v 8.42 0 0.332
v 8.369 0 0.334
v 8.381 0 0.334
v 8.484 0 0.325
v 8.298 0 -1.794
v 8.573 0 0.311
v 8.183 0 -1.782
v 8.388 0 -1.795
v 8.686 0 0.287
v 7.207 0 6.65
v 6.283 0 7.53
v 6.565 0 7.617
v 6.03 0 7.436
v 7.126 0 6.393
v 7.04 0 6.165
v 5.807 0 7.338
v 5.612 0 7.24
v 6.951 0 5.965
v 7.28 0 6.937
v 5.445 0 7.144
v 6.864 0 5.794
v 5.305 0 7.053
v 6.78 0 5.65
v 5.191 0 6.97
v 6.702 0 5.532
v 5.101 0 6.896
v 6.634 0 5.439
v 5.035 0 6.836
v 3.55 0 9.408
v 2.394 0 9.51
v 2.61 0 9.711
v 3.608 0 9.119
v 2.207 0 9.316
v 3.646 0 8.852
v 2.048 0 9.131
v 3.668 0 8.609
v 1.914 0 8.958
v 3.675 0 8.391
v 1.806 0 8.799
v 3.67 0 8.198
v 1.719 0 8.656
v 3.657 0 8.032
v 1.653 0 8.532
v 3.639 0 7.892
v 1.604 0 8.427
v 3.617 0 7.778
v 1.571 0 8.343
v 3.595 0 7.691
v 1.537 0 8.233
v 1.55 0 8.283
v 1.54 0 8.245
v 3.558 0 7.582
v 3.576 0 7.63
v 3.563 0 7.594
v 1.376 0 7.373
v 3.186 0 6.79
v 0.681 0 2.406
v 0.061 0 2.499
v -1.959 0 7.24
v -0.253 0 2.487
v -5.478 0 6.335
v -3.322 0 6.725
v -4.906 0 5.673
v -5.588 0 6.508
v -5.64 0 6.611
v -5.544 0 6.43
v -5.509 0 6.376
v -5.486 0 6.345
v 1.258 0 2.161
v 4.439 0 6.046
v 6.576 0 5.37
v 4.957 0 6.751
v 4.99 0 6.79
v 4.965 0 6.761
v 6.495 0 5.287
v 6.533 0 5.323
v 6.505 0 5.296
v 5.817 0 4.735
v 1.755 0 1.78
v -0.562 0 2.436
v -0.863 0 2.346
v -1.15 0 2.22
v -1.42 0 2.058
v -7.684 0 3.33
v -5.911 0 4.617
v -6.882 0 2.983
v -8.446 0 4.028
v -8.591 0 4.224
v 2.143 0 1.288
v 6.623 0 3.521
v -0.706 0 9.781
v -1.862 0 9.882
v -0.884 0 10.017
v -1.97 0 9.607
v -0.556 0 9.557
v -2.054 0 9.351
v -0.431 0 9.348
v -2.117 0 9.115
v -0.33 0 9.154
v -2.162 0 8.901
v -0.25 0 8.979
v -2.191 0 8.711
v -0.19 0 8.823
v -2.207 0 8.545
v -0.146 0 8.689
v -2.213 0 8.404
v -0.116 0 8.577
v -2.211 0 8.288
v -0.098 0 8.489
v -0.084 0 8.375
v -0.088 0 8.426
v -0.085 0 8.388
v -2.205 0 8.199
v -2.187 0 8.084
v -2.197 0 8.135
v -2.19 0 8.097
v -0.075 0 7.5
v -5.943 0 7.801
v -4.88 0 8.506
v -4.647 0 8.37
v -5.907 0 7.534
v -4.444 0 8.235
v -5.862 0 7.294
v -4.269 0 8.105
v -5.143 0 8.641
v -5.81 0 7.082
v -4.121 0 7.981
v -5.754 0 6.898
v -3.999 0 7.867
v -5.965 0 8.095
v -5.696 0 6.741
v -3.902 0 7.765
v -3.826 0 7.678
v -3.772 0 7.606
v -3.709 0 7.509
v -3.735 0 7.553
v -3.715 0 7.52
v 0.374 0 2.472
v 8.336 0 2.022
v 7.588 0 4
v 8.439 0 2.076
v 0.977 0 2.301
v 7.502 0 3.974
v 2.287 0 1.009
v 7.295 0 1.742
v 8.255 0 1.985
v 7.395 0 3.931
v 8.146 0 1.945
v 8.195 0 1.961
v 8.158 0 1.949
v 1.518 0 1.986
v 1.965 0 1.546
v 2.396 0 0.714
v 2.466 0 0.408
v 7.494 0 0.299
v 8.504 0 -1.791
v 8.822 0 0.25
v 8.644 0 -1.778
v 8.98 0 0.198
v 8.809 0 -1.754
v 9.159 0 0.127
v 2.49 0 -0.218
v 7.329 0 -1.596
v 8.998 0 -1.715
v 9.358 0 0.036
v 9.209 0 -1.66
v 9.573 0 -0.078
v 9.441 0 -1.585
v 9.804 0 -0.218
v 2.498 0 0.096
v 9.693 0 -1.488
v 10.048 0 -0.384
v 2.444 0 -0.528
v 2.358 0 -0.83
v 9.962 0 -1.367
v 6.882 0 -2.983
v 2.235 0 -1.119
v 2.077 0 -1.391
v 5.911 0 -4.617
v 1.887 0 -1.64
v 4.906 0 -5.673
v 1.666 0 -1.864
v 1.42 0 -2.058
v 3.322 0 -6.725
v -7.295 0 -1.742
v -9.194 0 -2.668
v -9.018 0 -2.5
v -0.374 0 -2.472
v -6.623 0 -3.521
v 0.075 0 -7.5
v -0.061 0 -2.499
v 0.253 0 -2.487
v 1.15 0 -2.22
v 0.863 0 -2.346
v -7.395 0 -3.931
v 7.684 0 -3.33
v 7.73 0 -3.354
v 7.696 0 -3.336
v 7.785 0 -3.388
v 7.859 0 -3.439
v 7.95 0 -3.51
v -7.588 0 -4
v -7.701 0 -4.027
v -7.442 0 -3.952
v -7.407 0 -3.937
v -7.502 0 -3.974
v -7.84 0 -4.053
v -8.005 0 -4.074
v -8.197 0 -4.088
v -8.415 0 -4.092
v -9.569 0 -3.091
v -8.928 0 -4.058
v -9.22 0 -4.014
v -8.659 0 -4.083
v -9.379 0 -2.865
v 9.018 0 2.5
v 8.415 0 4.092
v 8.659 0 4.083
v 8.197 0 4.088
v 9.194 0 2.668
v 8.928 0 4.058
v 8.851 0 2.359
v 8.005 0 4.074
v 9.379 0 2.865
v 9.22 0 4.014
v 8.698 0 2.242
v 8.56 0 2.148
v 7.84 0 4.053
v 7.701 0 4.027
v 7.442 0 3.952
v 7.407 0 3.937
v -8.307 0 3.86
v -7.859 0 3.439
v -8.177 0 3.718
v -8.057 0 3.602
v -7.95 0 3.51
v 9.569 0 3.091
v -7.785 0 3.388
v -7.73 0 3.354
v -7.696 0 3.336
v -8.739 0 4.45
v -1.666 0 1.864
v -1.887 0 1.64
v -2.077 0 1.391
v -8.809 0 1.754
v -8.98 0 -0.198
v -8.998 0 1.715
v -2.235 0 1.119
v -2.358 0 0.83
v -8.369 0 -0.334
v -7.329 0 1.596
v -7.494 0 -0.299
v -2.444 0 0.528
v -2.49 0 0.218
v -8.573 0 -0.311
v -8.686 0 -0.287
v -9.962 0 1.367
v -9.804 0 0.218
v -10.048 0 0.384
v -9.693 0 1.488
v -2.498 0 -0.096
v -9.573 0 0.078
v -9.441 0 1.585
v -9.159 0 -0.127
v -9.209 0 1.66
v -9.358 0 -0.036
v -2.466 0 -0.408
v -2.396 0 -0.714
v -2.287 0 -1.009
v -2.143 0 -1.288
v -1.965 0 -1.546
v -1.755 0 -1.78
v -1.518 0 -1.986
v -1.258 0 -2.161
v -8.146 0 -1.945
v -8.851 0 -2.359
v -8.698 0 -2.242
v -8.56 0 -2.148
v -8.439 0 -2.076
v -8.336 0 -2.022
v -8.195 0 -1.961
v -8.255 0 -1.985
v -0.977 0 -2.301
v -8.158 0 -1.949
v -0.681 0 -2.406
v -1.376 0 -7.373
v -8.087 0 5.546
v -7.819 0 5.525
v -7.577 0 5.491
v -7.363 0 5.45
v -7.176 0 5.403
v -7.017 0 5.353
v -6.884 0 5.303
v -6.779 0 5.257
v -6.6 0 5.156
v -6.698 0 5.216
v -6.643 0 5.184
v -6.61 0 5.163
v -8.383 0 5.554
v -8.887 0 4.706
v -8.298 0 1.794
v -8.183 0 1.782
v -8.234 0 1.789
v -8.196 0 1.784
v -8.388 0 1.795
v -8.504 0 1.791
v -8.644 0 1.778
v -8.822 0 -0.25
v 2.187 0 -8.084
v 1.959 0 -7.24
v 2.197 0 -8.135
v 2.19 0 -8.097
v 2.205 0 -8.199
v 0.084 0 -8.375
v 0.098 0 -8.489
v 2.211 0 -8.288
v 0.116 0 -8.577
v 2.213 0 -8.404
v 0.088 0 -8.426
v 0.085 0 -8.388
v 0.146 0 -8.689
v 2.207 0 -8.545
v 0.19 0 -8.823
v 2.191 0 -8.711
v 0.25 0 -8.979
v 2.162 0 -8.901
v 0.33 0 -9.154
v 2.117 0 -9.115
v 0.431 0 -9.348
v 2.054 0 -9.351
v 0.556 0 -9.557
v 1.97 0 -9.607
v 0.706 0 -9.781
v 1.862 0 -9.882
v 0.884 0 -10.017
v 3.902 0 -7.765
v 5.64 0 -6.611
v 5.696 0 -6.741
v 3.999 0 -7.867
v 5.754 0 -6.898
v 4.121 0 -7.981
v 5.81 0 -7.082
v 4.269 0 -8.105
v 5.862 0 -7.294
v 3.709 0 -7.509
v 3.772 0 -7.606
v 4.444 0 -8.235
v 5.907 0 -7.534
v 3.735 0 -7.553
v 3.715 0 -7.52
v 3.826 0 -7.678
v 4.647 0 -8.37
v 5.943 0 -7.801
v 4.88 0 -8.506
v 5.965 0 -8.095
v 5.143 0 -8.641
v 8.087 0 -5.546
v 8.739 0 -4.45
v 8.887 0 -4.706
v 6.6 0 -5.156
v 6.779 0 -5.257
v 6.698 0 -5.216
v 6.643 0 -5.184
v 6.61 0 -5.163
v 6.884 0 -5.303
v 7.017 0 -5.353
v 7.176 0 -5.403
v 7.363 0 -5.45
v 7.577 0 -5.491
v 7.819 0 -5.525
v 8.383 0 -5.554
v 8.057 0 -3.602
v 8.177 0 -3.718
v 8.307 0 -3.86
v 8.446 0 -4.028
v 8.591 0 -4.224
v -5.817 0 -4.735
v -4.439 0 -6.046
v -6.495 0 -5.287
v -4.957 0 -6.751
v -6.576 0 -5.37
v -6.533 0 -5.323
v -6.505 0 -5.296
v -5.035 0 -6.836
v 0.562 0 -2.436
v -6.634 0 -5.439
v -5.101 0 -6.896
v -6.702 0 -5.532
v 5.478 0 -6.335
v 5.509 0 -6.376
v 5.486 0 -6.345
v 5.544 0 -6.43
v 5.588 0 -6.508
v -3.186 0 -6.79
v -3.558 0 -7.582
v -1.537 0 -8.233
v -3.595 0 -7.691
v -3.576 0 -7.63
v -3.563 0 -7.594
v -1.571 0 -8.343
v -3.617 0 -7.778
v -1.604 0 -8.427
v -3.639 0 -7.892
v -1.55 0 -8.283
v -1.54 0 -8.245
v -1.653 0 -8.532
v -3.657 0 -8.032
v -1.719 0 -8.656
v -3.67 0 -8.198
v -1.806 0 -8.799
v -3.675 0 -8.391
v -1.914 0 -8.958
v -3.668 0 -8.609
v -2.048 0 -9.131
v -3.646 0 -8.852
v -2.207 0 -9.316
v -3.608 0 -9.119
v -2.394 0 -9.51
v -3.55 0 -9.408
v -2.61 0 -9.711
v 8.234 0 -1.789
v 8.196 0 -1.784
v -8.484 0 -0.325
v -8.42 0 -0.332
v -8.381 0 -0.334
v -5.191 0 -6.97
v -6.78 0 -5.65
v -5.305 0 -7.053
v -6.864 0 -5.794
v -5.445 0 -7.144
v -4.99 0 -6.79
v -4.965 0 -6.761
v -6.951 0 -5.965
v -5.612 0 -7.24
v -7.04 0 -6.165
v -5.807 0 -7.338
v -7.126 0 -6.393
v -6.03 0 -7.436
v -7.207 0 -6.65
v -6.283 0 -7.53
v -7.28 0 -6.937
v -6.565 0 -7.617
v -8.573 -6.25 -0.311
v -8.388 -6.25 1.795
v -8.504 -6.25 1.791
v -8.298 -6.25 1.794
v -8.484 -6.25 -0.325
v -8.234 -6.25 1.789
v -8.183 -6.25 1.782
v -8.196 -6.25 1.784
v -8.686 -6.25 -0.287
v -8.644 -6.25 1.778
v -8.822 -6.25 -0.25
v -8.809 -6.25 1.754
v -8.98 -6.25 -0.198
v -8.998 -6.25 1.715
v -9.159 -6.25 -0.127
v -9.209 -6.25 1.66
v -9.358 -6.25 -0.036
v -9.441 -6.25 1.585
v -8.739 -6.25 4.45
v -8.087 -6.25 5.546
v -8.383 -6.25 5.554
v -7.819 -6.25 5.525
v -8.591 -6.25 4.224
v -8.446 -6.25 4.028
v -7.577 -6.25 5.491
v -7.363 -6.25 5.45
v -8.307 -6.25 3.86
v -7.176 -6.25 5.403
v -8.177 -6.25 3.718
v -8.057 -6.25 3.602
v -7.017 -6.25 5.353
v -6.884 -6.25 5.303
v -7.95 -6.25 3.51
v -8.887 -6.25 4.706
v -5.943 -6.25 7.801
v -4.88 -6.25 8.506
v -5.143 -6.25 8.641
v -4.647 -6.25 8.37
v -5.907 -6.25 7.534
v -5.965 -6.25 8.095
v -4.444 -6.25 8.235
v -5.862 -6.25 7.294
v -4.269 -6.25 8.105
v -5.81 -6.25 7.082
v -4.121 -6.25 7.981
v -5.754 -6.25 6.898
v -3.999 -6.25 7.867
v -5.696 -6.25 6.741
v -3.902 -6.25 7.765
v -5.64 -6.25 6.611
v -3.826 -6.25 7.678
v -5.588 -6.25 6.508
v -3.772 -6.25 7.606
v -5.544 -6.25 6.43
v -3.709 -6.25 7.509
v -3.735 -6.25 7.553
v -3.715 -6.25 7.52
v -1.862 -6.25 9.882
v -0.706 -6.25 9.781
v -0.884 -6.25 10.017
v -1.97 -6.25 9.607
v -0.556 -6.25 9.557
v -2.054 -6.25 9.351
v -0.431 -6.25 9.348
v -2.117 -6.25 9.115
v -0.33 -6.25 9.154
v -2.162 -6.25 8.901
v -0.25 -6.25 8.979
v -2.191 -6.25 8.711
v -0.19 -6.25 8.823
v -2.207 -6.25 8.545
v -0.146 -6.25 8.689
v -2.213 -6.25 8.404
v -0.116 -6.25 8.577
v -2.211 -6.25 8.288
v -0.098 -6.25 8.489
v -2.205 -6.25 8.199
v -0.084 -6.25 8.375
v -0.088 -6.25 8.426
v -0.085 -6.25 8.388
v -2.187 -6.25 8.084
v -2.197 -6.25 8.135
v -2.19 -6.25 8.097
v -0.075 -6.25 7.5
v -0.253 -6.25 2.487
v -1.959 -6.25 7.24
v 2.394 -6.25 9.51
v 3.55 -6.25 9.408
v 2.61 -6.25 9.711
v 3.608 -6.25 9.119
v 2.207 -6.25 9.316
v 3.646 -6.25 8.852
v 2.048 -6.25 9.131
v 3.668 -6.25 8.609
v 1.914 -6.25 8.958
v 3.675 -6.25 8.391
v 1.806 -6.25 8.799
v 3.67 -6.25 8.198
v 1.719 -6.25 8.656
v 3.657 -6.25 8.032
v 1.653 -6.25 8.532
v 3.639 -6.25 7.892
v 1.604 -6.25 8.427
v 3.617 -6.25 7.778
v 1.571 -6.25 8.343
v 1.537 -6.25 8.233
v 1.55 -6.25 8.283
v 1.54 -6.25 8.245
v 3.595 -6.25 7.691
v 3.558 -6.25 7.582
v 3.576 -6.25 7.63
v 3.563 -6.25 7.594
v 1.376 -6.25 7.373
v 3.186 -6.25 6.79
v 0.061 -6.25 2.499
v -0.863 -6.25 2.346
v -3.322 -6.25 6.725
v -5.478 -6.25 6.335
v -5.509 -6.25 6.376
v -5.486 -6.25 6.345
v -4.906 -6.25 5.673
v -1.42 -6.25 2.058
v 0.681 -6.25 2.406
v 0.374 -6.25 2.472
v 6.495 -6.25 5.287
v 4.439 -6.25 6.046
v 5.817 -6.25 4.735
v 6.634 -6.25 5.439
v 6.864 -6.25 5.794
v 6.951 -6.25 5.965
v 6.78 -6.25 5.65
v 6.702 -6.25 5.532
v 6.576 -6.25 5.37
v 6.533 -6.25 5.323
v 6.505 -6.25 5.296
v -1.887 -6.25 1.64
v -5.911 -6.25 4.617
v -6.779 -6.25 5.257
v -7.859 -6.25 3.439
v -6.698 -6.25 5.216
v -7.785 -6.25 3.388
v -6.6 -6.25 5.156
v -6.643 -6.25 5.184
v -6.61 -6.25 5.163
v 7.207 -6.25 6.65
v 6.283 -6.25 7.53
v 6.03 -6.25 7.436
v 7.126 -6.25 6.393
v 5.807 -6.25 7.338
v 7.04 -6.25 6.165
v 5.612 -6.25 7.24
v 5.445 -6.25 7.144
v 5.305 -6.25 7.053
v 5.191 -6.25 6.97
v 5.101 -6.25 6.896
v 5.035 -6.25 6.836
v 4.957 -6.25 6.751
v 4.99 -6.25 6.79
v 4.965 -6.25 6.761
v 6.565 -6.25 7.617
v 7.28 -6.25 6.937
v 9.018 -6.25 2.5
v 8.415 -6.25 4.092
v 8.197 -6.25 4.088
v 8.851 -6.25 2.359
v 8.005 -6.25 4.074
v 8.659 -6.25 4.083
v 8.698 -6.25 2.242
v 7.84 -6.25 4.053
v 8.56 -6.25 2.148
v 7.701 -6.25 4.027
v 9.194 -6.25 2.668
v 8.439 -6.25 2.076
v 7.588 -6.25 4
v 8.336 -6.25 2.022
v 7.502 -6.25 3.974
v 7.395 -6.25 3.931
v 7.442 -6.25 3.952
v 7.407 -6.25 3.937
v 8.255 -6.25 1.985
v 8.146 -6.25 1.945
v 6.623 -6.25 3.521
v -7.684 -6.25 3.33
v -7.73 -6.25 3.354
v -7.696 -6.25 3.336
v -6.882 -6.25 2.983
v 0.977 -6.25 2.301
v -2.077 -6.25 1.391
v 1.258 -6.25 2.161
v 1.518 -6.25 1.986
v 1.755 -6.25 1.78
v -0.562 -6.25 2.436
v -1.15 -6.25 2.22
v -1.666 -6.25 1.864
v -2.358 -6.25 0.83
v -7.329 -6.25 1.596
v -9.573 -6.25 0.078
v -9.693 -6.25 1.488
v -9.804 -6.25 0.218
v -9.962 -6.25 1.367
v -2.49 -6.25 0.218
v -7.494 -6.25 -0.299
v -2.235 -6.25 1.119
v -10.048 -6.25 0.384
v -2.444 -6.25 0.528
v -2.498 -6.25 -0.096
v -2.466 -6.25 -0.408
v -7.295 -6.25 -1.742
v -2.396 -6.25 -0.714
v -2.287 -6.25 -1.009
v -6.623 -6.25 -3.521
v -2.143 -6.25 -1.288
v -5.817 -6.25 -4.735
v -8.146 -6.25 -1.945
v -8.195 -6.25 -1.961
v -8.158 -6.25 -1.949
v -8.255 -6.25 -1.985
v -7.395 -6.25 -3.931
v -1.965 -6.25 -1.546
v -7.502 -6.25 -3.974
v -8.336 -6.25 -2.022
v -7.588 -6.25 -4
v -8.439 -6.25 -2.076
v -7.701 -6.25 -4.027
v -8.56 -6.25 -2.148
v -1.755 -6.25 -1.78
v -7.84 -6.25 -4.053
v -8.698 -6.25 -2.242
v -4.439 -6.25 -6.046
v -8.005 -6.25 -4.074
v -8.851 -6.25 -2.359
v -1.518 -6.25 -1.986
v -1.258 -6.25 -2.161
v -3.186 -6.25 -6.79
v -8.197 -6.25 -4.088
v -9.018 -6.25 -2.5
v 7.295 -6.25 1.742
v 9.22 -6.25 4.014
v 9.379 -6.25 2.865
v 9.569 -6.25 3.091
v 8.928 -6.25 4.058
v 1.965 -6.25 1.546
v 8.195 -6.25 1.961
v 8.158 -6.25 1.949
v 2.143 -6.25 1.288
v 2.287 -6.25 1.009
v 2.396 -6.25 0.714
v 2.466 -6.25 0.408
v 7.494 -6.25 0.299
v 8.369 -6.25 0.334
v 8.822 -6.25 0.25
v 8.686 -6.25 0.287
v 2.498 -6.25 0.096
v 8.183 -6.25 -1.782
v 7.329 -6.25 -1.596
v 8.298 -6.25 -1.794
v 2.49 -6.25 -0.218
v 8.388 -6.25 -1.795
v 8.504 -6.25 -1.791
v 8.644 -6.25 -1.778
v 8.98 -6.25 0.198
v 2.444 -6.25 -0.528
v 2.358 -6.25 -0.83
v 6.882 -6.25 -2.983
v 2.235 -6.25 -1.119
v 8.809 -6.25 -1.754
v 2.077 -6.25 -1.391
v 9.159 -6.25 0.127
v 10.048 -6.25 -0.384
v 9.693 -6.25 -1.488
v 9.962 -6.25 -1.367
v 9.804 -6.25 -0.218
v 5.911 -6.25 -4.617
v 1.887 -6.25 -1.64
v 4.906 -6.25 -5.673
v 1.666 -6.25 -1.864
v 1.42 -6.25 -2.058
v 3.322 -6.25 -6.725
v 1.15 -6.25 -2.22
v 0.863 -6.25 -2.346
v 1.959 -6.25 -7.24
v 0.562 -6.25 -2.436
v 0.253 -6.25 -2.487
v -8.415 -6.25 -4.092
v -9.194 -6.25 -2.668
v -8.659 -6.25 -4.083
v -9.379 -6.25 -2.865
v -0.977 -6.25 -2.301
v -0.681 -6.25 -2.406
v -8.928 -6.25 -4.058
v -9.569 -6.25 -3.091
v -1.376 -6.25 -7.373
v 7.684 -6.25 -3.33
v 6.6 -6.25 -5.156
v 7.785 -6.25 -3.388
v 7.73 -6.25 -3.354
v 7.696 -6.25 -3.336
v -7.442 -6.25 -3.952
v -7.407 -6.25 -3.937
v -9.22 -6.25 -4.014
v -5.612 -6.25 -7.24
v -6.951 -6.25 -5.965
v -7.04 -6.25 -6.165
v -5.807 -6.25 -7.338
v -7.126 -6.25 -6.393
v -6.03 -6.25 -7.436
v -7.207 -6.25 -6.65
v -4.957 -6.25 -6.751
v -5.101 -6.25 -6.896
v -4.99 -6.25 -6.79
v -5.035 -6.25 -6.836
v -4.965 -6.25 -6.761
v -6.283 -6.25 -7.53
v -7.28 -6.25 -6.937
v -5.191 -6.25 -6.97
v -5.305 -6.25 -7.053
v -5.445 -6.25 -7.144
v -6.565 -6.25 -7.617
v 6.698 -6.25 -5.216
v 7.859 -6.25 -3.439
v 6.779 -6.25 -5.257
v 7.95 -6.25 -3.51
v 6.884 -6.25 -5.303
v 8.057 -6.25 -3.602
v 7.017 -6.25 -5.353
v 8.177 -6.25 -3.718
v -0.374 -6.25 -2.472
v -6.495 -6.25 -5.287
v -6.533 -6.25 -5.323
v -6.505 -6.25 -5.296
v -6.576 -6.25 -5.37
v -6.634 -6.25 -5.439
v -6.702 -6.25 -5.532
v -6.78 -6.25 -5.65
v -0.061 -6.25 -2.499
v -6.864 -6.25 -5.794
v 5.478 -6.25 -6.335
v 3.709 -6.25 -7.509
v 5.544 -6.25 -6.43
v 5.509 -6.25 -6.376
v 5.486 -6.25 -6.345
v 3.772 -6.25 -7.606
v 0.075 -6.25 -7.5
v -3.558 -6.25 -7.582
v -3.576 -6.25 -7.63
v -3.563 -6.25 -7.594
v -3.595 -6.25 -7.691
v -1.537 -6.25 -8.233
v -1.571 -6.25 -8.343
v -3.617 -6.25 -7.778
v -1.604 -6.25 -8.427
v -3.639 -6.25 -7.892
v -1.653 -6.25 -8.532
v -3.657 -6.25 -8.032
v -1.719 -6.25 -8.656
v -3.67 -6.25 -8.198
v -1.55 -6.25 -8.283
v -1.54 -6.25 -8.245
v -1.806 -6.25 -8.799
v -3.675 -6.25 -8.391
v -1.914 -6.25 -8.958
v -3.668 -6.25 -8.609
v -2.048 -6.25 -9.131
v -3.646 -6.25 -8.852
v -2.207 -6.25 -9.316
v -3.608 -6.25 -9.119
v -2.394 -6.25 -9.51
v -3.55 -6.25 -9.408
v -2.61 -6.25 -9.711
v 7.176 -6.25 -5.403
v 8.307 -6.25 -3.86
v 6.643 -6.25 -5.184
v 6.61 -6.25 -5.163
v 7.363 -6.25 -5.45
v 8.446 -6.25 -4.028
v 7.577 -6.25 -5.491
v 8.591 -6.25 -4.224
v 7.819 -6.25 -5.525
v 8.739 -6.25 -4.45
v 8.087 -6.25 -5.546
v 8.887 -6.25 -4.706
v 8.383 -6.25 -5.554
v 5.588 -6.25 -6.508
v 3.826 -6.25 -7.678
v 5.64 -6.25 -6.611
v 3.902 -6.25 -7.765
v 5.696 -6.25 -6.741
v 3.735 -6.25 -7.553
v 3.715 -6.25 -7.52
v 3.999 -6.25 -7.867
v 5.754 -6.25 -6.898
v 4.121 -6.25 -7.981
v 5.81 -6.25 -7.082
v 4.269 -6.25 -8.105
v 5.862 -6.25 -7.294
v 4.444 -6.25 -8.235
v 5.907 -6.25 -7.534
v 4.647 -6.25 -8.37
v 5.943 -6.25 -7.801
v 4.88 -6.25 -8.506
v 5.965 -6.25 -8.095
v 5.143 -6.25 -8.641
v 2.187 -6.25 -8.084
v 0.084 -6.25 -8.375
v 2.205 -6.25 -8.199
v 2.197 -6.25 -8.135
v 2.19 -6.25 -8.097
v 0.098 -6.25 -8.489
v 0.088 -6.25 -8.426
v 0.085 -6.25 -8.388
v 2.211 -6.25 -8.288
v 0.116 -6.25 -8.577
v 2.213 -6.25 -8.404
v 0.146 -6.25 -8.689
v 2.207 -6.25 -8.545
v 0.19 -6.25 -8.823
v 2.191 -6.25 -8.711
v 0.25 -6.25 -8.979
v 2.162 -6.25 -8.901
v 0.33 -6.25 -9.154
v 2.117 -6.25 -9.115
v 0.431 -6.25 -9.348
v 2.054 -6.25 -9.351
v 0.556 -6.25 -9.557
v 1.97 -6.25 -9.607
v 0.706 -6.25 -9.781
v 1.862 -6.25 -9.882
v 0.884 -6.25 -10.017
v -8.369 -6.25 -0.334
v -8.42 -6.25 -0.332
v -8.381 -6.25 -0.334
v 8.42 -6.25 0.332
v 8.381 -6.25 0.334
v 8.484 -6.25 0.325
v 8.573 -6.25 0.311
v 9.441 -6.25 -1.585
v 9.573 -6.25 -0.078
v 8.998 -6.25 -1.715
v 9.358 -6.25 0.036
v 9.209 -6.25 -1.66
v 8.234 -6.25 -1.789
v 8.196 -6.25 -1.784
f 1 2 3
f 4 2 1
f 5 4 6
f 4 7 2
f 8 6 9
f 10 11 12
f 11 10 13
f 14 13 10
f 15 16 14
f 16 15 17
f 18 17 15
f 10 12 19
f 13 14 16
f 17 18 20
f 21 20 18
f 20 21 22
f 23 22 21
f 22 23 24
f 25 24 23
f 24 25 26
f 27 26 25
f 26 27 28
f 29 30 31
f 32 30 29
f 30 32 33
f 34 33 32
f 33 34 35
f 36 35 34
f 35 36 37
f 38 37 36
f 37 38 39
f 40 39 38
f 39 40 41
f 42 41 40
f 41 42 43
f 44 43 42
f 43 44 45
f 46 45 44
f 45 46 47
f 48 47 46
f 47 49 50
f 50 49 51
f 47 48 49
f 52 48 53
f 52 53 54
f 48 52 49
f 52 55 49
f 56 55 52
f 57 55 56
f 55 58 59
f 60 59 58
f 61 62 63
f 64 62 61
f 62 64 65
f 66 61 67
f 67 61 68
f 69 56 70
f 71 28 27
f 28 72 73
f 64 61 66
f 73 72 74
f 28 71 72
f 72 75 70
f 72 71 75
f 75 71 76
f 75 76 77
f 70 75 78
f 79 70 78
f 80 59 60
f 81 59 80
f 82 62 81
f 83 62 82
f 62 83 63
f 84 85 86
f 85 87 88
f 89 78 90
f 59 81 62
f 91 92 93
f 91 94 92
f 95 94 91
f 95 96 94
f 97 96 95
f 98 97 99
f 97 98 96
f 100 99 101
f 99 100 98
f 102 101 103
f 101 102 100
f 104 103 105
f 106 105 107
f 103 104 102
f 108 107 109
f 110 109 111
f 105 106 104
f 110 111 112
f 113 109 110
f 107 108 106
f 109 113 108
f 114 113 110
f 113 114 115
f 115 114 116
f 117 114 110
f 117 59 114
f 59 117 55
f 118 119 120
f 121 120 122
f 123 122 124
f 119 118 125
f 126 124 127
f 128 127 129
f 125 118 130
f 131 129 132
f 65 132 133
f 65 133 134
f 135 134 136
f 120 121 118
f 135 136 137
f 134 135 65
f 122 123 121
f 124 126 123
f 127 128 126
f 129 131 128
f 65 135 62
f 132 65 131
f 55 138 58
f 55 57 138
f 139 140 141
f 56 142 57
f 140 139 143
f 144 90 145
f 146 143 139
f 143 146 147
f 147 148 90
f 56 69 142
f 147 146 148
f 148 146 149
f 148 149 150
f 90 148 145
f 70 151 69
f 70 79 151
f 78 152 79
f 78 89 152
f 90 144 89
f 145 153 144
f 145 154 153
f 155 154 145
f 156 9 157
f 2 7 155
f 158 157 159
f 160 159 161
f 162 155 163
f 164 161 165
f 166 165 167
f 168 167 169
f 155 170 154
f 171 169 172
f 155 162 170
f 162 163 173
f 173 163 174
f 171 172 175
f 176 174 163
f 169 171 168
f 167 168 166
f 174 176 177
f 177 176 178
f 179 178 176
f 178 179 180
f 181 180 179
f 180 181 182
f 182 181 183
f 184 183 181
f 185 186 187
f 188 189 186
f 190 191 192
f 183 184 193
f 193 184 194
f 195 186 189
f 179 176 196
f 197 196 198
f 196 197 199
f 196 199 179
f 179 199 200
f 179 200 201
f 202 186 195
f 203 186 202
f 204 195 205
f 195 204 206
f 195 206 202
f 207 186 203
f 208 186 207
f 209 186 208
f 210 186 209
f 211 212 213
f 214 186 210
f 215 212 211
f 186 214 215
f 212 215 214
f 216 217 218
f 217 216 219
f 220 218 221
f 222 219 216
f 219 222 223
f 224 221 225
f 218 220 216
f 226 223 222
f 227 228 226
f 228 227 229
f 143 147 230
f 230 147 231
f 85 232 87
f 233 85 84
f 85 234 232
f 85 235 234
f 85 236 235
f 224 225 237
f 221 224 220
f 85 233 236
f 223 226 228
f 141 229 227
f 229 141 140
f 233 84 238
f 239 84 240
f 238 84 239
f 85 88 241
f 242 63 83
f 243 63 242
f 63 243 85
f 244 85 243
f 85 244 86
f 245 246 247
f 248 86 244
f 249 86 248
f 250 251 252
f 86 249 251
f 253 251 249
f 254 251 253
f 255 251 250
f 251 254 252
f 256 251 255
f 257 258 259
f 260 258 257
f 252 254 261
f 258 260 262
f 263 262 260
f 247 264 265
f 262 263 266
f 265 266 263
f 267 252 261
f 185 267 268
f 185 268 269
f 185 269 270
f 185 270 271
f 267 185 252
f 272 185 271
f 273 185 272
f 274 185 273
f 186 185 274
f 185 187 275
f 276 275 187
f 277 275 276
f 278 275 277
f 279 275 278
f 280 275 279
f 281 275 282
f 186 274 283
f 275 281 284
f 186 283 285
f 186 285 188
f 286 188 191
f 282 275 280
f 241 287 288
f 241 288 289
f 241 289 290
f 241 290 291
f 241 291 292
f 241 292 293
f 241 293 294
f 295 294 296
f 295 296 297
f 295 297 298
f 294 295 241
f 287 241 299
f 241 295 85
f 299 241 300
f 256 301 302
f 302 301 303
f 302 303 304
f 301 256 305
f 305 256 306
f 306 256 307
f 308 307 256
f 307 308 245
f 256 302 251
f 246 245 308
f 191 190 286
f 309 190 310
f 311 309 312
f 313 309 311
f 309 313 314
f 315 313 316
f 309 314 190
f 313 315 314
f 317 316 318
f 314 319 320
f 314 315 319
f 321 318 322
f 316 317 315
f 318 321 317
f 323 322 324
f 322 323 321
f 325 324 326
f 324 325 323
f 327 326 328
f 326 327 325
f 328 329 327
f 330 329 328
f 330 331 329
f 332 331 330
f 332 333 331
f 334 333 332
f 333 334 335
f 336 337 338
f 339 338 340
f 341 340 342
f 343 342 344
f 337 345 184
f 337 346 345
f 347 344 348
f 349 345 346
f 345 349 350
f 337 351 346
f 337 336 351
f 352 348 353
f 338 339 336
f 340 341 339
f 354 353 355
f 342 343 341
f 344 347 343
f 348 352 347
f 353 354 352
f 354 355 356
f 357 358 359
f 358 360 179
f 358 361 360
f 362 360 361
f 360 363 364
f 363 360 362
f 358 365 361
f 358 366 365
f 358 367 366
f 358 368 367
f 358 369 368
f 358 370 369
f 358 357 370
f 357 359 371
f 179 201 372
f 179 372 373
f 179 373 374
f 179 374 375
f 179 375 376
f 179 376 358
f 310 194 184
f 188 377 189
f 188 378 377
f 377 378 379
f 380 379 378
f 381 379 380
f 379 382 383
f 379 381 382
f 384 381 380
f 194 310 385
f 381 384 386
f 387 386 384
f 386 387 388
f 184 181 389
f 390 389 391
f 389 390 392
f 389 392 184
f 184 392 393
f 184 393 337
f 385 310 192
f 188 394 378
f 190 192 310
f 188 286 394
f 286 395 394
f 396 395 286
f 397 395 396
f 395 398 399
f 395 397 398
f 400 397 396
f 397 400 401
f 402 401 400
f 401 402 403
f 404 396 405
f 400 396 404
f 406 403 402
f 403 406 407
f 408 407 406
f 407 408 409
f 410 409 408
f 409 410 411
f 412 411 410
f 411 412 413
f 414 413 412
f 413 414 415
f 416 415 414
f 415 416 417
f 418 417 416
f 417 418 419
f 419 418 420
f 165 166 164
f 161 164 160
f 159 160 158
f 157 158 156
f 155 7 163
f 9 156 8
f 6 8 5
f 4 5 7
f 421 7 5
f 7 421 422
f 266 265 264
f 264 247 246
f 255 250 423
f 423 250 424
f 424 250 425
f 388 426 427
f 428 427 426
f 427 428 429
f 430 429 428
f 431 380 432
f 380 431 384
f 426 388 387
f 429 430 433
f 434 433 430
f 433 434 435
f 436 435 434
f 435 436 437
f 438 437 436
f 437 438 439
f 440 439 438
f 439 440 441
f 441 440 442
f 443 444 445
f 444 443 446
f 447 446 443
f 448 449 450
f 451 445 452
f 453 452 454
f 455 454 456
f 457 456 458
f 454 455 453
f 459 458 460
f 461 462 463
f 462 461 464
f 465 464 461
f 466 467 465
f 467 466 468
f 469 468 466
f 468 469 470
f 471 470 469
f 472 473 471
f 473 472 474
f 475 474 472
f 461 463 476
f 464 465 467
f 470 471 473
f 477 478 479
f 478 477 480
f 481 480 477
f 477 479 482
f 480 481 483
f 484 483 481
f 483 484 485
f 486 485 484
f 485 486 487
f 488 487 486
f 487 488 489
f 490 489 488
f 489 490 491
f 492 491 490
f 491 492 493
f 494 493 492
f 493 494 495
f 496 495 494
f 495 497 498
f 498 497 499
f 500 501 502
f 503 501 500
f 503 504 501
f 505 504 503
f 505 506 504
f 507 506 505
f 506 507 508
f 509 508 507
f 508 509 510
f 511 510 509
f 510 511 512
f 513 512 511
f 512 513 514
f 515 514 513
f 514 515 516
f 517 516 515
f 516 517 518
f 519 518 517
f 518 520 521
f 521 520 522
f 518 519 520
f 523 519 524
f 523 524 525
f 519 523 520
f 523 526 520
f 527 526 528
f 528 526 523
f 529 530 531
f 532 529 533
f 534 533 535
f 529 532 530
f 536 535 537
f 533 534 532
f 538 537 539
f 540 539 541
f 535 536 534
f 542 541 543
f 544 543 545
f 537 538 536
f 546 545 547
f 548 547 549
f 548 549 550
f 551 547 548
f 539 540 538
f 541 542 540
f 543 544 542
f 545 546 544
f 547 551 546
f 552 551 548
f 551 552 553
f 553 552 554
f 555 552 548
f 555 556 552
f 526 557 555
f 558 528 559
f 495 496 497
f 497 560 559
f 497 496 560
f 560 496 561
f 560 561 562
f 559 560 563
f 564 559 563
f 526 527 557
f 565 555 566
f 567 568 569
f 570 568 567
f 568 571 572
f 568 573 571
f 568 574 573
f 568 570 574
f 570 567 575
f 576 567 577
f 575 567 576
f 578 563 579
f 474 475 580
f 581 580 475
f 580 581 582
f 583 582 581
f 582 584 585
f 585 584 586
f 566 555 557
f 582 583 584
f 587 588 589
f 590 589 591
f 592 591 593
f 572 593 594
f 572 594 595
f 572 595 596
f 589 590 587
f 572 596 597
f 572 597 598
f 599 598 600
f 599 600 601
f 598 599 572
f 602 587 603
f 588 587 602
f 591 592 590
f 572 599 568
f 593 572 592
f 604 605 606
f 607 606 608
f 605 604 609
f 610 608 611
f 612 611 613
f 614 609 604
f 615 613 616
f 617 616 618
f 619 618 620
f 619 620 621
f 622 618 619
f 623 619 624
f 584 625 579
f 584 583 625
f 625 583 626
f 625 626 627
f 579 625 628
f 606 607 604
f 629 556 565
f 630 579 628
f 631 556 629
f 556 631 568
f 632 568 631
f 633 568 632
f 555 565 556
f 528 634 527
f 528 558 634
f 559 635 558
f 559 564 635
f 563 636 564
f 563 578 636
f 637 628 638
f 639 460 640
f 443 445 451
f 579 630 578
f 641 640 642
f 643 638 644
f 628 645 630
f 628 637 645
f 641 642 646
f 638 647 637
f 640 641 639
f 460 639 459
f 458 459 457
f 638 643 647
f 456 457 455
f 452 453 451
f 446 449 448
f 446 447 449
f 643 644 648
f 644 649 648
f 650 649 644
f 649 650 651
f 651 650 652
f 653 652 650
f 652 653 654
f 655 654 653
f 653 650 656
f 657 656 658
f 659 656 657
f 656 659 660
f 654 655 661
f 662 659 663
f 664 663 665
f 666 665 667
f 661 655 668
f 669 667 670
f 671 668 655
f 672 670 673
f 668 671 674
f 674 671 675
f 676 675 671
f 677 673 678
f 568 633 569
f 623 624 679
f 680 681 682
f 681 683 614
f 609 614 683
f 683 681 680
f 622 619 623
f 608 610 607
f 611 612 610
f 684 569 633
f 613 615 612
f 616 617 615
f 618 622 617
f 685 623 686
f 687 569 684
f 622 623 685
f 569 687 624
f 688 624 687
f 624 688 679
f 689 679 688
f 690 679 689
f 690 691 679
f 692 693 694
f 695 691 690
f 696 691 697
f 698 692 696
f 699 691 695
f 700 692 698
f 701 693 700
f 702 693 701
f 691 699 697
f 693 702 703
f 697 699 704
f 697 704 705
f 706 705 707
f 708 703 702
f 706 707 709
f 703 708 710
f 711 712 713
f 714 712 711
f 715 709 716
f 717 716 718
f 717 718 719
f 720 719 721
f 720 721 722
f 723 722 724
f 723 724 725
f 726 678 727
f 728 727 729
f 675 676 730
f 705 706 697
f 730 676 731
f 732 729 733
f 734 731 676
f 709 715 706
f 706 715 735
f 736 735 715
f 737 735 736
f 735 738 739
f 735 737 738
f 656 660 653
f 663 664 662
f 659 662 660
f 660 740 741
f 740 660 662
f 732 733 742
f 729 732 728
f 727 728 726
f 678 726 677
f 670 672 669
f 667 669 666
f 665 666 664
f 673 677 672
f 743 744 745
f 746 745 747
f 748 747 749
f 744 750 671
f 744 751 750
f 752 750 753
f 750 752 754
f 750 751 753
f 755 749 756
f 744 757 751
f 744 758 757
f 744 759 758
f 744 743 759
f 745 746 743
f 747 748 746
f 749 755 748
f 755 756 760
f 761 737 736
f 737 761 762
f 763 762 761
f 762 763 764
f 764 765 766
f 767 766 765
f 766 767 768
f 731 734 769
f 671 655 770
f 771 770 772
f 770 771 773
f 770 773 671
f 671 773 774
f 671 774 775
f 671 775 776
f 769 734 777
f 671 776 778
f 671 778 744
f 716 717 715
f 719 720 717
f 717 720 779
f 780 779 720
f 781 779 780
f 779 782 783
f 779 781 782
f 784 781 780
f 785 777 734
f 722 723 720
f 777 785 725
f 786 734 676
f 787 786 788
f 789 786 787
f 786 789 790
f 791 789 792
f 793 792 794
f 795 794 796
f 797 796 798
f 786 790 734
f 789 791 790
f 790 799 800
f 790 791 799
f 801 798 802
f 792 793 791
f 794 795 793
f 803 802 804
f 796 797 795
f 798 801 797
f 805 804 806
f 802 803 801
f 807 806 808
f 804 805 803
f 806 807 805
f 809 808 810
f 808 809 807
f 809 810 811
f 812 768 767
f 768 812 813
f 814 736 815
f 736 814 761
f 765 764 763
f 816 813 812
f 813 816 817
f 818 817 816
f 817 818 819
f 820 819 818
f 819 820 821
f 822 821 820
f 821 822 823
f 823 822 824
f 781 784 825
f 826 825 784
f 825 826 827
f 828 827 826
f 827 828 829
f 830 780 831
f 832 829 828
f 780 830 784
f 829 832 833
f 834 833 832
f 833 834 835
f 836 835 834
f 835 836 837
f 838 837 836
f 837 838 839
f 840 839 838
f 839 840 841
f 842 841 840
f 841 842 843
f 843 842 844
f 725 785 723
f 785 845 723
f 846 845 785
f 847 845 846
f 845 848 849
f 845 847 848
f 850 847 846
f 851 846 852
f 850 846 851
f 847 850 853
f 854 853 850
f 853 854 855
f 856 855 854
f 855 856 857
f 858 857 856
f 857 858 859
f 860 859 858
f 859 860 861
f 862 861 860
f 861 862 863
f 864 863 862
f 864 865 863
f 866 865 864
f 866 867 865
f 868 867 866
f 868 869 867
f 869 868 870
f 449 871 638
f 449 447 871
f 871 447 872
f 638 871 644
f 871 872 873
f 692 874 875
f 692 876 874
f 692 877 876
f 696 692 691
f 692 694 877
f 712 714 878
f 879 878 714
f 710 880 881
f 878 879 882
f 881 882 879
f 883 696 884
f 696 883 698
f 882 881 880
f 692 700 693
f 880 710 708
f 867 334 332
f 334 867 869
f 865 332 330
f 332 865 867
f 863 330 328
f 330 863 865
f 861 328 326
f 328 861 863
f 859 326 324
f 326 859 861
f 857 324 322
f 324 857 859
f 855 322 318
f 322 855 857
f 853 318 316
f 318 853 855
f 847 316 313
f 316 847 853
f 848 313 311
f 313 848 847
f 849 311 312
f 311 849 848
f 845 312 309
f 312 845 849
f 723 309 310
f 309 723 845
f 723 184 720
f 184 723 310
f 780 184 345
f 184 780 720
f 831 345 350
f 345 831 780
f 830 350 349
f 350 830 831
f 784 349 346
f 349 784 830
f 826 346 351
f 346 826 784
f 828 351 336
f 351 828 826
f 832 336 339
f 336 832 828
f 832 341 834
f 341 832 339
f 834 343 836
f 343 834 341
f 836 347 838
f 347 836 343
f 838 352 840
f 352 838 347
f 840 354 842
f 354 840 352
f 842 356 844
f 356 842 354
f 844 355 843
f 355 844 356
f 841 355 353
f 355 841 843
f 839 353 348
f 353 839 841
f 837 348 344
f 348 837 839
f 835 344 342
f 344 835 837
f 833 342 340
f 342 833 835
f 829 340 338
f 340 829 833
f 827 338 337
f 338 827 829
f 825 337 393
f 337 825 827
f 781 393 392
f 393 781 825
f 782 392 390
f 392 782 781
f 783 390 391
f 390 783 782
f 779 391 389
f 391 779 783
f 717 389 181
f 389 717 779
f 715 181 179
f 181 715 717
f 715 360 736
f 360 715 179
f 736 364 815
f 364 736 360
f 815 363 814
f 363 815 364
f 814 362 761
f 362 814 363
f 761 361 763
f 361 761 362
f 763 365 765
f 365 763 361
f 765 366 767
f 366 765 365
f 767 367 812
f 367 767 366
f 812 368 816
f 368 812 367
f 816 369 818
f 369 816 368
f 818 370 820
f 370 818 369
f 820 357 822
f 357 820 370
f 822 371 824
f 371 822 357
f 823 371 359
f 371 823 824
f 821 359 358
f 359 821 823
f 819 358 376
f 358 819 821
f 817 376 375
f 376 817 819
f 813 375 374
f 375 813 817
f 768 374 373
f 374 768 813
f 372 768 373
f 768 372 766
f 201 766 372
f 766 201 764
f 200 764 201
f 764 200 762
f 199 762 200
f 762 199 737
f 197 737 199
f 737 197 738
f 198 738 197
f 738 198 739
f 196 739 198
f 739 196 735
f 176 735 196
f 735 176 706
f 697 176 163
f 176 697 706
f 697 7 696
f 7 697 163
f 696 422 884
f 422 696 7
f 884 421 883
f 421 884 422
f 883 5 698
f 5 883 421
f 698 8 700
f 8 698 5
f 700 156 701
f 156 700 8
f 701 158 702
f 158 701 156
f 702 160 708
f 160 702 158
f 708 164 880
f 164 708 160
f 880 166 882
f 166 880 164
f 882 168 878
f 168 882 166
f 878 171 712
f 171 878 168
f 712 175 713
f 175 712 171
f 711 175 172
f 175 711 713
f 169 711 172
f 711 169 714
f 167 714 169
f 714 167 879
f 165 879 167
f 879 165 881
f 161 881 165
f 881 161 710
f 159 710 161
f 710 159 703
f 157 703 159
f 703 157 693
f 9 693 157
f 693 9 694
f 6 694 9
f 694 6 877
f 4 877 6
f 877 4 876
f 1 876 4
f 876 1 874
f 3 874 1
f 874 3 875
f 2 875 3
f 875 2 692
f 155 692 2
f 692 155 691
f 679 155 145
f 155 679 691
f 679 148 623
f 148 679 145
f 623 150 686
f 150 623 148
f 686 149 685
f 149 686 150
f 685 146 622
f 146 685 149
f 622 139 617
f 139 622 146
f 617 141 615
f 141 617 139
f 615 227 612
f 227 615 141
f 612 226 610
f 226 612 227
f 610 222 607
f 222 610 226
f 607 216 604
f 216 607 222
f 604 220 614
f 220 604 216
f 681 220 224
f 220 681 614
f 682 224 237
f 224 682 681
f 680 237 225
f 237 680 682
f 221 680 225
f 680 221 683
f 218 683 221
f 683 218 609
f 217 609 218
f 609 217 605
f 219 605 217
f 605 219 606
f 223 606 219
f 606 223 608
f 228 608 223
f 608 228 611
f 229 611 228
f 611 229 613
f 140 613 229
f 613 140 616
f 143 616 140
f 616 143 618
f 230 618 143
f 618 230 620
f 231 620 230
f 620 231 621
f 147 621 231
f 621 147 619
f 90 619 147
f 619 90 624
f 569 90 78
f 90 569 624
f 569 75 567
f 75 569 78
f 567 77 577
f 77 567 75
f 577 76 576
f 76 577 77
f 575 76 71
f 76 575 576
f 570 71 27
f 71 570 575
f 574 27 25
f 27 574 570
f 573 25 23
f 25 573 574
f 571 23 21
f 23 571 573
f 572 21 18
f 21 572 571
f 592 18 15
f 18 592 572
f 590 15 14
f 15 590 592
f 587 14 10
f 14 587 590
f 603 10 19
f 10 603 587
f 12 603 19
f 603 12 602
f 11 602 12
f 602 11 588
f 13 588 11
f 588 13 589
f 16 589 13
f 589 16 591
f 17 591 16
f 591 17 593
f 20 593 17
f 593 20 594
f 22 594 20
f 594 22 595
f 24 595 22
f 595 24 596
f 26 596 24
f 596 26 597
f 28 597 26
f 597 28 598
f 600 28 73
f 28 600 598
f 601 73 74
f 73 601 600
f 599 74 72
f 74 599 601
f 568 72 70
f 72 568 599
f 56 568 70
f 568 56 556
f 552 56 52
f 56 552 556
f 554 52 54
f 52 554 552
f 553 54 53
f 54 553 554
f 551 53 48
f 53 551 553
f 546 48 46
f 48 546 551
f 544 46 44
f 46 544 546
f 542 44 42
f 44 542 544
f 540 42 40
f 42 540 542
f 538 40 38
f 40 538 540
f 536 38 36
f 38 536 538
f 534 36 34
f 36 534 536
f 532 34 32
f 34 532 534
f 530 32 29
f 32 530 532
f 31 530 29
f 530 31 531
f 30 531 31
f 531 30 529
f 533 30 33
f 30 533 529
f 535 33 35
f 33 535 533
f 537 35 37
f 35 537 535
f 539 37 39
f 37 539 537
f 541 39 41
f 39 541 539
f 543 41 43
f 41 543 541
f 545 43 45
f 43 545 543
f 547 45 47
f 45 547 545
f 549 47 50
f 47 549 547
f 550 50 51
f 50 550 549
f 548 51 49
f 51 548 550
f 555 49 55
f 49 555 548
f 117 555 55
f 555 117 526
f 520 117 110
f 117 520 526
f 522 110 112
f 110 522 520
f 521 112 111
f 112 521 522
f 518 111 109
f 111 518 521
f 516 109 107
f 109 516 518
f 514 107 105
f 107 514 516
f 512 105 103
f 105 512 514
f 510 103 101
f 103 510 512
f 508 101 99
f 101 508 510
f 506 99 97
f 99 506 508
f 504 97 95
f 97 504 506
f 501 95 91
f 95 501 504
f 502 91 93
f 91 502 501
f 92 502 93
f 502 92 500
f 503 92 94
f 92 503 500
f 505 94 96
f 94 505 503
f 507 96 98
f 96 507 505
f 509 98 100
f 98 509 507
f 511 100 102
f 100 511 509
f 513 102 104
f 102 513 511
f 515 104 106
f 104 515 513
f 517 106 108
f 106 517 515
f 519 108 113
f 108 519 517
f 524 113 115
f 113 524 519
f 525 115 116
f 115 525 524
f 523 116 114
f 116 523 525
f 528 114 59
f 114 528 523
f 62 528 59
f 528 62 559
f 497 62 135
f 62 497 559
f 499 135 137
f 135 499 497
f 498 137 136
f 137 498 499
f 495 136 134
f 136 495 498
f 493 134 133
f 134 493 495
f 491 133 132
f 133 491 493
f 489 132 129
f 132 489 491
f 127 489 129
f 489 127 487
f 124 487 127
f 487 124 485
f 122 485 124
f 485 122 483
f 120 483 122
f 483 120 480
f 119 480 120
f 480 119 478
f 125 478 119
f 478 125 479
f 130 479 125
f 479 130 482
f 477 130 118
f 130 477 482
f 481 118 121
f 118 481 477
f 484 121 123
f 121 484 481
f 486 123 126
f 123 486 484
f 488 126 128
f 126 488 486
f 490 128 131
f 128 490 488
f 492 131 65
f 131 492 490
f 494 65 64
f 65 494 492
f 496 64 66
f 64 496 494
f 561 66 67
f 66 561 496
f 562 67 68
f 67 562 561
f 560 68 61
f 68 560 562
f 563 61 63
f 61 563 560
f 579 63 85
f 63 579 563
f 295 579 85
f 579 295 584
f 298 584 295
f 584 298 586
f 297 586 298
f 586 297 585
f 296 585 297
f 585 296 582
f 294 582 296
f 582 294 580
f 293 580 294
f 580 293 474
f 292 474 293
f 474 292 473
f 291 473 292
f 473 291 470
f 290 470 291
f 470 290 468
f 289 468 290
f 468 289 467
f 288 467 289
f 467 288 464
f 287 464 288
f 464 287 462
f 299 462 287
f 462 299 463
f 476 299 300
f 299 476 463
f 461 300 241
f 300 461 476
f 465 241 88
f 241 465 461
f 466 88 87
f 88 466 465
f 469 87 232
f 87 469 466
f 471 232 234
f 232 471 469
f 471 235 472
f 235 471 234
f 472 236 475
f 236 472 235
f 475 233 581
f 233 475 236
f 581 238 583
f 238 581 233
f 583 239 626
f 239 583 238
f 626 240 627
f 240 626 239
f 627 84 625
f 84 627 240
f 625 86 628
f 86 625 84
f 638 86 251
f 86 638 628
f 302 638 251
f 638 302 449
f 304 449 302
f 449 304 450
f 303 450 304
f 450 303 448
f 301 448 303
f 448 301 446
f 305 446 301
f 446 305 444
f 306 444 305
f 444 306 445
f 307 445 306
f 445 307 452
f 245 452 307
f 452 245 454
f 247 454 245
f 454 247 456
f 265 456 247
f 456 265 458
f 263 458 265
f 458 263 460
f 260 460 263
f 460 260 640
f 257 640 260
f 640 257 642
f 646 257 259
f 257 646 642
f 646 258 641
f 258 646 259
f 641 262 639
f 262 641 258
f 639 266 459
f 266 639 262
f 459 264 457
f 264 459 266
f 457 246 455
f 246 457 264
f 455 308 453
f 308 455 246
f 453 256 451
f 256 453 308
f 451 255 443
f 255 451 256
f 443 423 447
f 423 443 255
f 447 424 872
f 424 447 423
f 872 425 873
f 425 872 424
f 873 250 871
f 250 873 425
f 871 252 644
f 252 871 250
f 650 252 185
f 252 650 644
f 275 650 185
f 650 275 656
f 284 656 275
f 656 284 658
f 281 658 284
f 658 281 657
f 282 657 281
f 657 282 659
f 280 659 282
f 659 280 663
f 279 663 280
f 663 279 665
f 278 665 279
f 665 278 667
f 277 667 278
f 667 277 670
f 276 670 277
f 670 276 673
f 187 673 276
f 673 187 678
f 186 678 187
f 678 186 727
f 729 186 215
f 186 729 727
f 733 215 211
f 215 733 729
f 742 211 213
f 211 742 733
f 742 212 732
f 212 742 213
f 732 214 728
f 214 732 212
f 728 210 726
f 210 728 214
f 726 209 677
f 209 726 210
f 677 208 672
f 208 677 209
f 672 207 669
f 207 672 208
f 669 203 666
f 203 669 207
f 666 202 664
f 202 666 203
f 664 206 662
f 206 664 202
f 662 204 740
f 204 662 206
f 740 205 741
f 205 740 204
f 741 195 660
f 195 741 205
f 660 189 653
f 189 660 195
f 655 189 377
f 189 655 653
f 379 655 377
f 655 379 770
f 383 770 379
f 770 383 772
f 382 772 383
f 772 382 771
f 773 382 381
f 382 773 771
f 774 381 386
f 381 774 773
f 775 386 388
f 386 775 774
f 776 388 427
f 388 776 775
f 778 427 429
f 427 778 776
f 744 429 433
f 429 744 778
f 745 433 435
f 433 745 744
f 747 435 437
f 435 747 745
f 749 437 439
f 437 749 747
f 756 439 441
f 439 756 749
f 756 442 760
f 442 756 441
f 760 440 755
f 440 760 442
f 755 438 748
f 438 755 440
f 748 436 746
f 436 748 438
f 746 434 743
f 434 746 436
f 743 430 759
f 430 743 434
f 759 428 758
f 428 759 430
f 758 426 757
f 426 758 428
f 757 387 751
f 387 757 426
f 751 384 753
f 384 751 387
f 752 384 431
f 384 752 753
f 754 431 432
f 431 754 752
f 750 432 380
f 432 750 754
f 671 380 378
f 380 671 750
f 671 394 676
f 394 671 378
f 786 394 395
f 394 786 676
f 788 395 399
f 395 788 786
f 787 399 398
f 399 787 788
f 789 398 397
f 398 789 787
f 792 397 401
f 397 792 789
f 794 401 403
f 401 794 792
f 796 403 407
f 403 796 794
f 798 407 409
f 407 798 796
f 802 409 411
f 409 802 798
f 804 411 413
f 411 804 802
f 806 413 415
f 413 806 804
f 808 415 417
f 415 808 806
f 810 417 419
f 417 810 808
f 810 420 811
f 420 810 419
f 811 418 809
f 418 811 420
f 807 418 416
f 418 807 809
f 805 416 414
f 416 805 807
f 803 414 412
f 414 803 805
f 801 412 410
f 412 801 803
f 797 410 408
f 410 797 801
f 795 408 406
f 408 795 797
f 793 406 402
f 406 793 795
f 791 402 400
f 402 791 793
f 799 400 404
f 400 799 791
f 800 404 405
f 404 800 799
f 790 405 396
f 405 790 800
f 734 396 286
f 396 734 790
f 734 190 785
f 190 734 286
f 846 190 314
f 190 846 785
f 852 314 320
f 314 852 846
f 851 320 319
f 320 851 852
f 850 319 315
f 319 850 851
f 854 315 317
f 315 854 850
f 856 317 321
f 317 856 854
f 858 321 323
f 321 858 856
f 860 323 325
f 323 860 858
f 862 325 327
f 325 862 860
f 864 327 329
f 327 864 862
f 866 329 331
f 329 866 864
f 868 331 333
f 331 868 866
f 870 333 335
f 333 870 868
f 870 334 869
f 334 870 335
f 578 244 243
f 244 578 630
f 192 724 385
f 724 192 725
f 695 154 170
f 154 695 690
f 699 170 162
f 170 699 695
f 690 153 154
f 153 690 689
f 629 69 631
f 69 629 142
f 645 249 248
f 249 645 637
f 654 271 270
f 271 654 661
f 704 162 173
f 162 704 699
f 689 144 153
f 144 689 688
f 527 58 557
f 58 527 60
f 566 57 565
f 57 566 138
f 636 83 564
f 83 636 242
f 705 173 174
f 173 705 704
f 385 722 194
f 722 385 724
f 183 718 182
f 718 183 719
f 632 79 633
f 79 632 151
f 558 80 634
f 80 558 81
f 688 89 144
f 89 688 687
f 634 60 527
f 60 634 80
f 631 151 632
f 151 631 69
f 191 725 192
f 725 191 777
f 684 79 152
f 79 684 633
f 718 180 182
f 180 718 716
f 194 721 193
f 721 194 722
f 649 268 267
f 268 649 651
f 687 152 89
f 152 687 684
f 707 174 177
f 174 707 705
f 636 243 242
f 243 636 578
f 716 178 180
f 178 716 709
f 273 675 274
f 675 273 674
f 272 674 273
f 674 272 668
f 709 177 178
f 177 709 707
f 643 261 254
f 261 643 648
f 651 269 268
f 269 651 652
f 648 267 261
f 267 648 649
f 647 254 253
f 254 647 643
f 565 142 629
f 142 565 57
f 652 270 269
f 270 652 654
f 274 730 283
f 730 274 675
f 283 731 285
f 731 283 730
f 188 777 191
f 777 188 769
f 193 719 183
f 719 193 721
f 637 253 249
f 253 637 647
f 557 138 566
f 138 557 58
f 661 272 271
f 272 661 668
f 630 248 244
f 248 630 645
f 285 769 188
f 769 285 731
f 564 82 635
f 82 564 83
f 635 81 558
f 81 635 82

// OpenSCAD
// file: std_mechanical_lib_rackAndPinion.scad
// Rack and pinion gears GPL (c) SASA October 2013.
//
// Very simple rack and pinion gear based on GPL code.
//
// I've made corrections to both rack and gear code I used (below) and unified
// and simplified both bits of code.  Corrects the use of circular pitch so
// rack and pinion match nicely.  Ammendments to the code and interface to
// simplify use and improve readability. Many bells and whistles dropped in
// favour of being dead simple.  I also opted for hard wiring the pressure
// angle to 20 degrees since this seemed a kind of standard.
//
// Based on the works (thanks!): Parametric Involute Bevel and Spur Gears by
// GregFrost GNU GPL license.  http://www.thingiverse.com/thing:3575 Parametric
// Modular Rack by Mark "Ckaos" Moissette GNU GPL license.  (Rack based on the
// work of MattMoses and Fdavies
// http://forums.reprap.org/read.php?1,51452,52099#msg-52099 and Forrest Higgs:
// 
// The originals have many fine additions such as helical gears which I've
// dropped in favour of simplicity (as befits my needs) - it wouldn't be a big
// jobs to nobble my changes backwards or their features forwards.

pi=3.1415926535897932384626433832795;
$fn=50;

// examples of usage
// include this in your code:
// use <rack_and_pinion.scad>
// then:
// a simple rack
// rack(4,20,10,1);//CP (mm/tooth), width (mm), thickness(of base) (mm), # teeth
// a simple pinion and translation / rotation to make it mesh the rack
// translate([0,-8.5,0])rotate([0,0,360/10/2]) pinion(4,10,10,5);





module rack(cp, N, width, thickness){
// cp = circular pitch - for rack = pitch in mm/per tooth
// N = number of teeth
// width = width of rack
// thickness = thickness of support under teeth (0 for no support)

	a = 1.0*cp/pi; // addendum (also known as "module")
	d = 1.1*cp/pi; // dedendum (this is set by a standard)
	height=(d+a);

	// find the tangent of pressure angle once
	tanPA = tan(20);
	// length of bottom and top horizontal segments of tooth profile
	botL = (cp/2 - 2*d*tanPA);
	topL = (cp/2 - 2*a*tanPA);

	slantLng=tanPA*height;
	realBase=2*slantLng+topL;

	offset=topL+botL+2*slantLng;
	length=(realBase+botL)*N;

	supportSize=width;
	translate([botL/2,0,0])
	rotate([90,0,0]){
		translate([0,supportSize/2,0]){
			union(){
				cube(size=[length,width,thickness],center=true);
				for (i = [0:N-1]){
					translate([i*offset-length/2+realBase/2,0,thickness/2]){
						trapezoid([topL,supportSize],[realBase,supportSize],height);
						}
					}
				}
			}
		}
	}

module pinion (cp, N, width, shaft_diameter, backlash=0){
// cp= circular pitch - for pinion pitch in mm/per as measured along the ptich radius (~1/2 way up tooth)
// N= number of teeth
// width= width of the gear
// shaft_diameter= diameter of hole for shaft
// backlash - I think this is just a bodge for making things fit when printed but I never tested it

	if (cp==false && diametral_pitch==false) 
		echo("MCAD ERROR: pinion module needs either a diametral_pitch or cp");

	//Convert diametrial pitch to our native circular pitch
	cp = (cp!=false?cp:180/diametral_pitch);

	// Pitch diameter: Diameter of pitch circle.
	pitch_diameter  =  N * cp / pi;
	pitch_radius = pitch_diameter/2;
	echo ("Teeth:", N, " Pitch radius:", pitch_radius);
	// Base Circle
	base_radius = pitch_radius*cos(20);

	// Addendum: Radial distance from pitch circle to outside circle.
	addendum = cp/pi;

	//Outer Circle
	outer_radius = pitch_radius+addendum;

	// Dedendum: Radial distance from pitch circle to root diameter
	dedendum = addendum*1.1;

	// Root diameter: Diameter of bottom of tooth spaces.
	root_radius = pitch_radius-dedendum;

	backlash_angle = backlash / pitch_radius * 180 / pi;
	half_thick_angle = (360 / N - backlash_angle) / 4;

	difference(){
		linear_extrude (height=width, convexity=10, twist=0)
		pinion_shape(N, pitch_radius = pitch_radius, root_radius = root_radius,
			base_radius = base_radius, outer_radius = outer_radius,
			half_thick_angle = half_thick_angle, involute_facets=0);

		translate([0,0,-1]) cylinder(r=shaft_diameter/2,h=2+width);
		}

	echo("Root radius =",root_radius,"\nPitch radius=",pitch_radius,"\n Tip radius=",outer_radius,"\n");
	}

module pinion_shape ( N, pitch_radius, root_radius, base_radius, outer_radius, half_thick_angle, involute_facets) {
	union(){
		rotate (half_thick_angle) circle ($fn=N*2, r=root_radius);
		for (i = [1:N]) {
			rotate ([0,0,i*360/N]) {
				involute_pinion_tooth (
					pitch_radius = pitch_radius,
					root_radius = root_radius,
					base_radius = base_radius,
					outer_radius = outer_radius,
					half_thick_angle = half_thick_angle,
					involute_facets=involute_facets);
				}
			}
		}
	}

module involute_pinion_tooth ( pitch_radius, root_radius, base_radius, outer_radius, half_thick_angle, involute_facets) {
	min_radius = max (base_radius,root_radius);

	pitch_point = involute (base_radius, involute_intersect_angle (base_radius, pitch_radius));
	pitch_angle = atan2 (pitch_point[1], pitch_point[0]);
	centre_angle = pitch_angle + half_thick_angle;

	start_angle = involute_intersect_angle (base_radius, min_radius);
	stop_angle = involute_intersect_angle (base_radius, outer_radius);

	res=(involute_facets!=0)?involute_facets:($fn==0)?5:$fn/4;

	union () {
		for (i=[1:res])
		assign ( point1=involute (base_radius,start_angle+(stop_angle - start_angle)*(i-1)/res), point2=involute (base_radius,start_angle+(stop_angle - start_angle)*i/res)) {
			assign (
				side1_point1=rotate_point (centre_angle, point1),
				side1_point2=rotate_point (centre_angle, point2),
				side2_point1=mirror_point (rotate_point (centre_angle, point1)),
				side2_point2=mirror_point (rotate_point (centre_angle, point2))) {
				polygon ( points=[[0,0],side1_point1,side1_point2,side2_point2,side2_point1], paths=[[0,1,2,3,4,0]]);
				}
			}
		}
	}

// Mathematical Functions
//===============

// Finds the angle of the involute about the base radius at the given distance (radius) from it's center.
//source: http://www.mathhelpforum.com/math-help/geometry/136011-circle-involute-solving-y-any-given-x.html

function involute_intersect_angle (base_radius, radius) = sqrt (pow (radius/base_radius, 2) - 1) * 180 / pi;

// Calculate the involute position for a given base radius and involute angle.

function rotated_involute(rotate,base_radius,involute_angle)=[cos(rotate)*involute(base_radius, involute_angle)[0]+sin(rotate)*involute(base_radius, involute_angle)[1],cos(rotate)*involute(base_radius, involute_angle)[1]-sin(rotate)*involute(base_radius, involute_angle)[0]];

function mirror_point(coord)=[coord[0],-coord[1]];

function rotate_point(rotate,coord)=[cos(rotate)*coord[0]+sin(rotate)*coord[1],cos(rotate)*coord[1]-sin(rotate)*coord[0]];

function involute (base_radius, involute_angle)=[base_radius*(cos(involute_angle)+involute_angle*pi/180*sin(involute_angle)),base_radius*(sin(involute_angle)-involute_angle*pi/180*cos(involute_angle))];




module trapezoid(top,base,height){
	//echo ("test",base[0]);
	basePT1=[ -base[0]/2, base[1]/2, 0];
	basePT2=[ base[0]/2, base[1]/2, 0];
	basePT3=[ base[0]/2, -base[1]/2, 0];
	basePT4=[ -base[0]/2, -base[1]/2, 0];
	topPT1=[ -top[0]/2, top[1]/2, height];
	topPT2=[ top[0]/2, top[1]/2, height];
	topPT3=[ top[0]/2, -top[1]/2, height];
	topPT4=[ -top[0]/2, -top[1]/2, height];
	polyhedron(points=[ basePT1, basePT2, basePT3, basePT4, topPT1, topPT2, topPT3, topPT4],triangles=[[0,1,2], [0,2,3],[3,7,0], [7,4,0],[1,6,2], [1,5,6],[2,6,3], [3,6,7],[5,1,0],[4,5,0],[7,5,4],[5,7,6]]);
	}
// main file
use <std_mechanical_lib_rackAndPinion.scad>
module mechanical_cuvetteTrayMotorPinion(){
	rotate([90,5,0]){
		color([.6,.7,.2]) pinion(4,14,6.25,5);
	}
}

translate([0,0,0]){
	mechanical_cuvetteTrayMotorPinion();
}
